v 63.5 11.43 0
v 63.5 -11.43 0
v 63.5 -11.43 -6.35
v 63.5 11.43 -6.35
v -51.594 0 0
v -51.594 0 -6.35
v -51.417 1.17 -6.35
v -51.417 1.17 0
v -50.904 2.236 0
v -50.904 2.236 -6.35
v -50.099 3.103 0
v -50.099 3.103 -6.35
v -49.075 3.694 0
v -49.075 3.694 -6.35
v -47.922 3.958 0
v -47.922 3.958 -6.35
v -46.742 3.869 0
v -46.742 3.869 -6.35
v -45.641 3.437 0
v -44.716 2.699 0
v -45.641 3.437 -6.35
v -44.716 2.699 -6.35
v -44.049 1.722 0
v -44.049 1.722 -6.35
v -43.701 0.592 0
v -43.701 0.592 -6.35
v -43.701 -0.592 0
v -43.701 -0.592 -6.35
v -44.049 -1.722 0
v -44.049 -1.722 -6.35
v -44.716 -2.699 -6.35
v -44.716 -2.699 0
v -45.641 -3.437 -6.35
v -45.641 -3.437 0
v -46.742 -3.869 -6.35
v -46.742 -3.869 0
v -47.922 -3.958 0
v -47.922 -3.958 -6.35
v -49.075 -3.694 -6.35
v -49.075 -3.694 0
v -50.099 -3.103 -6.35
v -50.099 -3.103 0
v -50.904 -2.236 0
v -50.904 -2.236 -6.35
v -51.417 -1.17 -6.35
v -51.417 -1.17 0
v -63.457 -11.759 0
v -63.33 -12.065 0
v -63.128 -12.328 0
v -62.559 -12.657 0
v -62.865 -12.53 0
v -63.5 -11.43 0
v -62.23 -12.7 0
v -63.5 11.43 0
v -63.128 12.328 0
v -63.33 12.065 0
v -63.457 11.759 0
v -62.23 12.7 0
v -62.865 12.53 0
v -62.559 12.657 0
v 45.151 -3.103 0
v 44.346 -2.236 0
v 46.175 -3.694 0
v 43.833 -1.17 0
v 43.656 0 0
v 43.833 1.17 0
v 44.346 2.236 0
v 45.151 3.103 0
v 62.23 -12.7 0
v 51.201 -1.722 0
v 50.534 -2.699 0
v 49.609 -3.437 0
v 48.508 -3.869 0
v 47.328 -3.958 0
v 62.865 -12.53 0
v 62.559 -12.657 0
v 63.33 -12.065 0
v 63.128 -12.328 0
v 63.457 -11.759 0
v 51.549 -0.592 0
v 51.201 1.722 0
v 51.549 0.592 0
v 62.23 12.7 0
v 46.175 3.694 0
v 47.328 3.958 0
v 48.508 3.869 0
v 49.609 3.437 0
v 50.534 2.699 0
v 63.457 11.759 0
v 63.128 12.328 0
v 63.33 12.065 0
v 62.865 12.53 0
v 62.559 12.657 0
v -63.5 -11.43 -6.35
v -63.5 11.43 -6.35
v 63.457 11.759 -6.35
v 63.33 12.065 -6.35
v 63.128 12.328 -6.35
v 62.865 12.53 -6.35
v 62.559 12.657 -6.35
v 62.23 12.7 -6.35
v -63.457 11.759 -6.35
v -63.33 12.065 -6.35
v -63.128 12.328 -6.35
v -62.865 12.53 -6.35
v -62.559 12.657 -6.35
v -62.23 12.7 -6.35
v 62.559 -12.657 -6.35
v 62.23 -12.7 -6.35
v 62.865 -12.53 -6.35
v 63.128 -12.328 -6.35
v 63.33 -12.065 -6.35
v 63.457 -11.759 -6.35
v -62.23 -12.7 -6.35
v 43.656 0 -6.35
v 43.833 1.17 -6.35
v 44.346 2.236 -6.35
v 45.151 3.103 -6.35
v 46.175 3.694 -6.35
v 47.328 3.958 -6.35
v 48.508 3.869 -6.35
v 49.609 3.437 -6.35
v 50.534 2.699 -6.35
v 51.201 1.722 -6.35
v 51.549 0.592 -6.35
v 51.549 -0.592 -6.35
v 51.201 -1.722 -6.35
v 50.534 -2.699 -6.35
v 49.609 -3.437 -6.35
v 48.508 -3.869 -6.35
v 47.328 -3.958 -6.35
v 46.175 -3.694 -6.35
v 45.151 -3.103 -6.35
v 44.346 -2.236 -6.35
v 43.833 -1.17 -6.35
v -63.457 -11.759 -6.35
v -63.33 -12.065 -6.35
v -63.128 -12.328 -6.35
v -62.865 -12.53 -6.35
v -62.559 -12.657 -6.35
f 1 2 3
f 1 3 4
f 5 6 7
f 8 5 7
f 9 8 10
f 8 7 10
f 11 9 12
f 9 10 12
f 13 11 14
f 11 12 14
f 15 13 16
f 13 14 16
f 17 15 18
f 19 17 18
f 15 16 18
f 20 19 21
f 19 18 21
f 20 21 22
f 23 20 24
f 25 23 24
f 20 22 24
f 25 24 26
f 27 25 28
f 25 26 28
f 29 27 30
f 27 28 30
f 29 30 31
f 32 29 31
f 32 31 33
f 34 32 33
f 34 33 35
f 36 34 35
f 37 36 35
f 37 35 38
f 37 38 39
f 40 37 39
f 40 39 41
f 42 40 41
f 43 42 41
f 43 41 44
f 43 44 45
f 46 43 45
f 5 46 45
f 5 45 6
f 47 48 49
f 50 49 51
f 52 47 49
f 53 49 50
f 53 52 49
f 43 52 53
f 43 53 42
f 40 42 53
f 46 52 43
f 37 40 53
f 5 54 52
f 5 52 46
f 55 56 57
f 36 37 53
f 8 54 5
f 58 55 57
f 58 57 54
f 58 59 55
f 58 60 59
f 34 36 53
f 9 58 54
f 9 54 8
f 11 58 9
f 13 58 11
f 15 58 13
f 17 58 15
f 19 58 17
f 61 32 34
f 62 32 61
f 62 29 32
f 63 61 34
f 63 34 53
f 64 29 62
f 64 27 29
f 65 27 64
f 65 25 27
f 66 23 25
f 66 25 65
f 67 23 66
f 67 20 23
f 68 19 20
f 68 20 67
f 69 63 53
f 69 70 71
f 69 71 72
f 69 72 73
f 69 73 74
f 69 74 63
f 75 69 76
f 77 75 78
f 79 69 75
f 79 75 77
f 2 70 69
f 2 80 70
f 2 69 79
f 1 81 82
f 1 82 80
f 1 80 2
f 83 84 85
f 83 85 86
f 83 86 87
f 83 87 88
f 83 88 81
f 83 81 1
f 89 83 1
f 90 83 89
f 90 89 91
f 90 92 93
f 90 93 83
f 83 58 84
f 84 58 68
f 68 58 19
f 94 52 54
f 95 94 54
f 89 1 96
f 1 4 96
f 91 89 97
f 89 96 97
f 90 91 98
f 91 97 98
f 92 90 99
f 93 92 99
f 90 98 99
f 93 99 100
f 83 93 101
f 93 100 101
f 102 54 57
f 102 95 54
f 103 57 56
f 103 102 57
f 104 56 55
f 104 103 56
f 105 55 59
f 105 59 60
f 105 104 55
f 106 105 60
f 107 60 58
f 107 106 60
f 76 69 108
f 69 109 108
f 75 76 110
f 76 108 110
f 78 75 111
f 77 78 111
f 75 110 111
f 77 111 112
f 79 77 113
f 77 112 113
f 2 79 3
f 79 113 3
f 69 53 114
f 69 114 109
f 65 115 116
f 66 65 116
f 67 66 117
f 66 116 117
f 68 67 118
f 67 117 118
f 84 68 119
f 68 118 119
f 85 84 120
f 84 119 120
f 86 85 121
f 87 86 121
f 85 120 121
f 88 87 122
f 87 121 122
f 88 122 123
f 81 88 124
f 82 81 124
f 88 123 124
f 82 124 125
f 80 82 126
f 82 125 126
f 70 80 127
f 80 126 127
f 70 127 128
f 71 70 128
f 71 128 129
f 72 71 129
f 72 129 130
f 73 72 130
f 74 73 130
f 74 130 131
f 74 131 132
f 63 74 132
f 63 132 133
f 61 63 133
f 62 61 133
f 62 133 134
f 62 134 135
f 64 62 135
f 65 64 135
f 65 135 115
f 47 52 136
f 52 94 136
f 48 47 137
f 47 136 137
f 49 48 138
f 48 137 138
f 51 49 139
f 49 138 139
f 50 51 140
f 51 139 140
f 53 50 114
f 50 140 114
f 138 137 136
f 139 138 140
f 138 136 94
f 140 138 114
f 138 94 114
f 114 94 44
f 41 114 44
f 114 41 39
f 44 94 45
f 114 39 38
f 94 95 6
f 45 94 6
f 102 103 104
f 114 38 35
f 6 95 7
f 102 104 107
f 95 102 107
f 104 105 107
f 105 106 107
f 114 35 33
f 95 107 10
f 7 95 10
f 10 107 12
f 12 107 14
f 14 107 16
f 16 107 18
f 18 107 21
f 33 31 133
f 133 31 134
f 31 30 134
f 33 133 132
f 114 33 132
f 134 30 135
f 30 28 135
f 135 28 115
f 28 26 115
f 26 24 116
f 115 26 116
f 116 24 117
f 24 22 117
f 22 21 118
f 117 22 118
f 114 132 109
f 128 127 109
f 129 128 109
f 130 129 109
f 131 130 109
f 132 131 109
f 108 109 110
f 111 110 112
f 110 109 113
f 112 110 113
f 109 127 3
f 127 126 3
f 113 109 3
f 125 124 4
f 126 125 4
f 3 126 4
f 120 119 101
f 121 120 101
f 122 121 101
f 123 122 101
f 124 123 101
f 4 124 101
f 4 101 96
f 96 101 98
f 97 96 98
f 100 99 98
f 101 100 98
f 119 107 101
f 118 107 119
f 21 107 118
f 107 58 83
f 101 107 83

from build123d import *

# Parameters (mm, degrees)
F0_W     = 127
F0_H     = 25.4
F1_DEPTH = 6.35
F2_R     = 1.27
F4_D     = 7.9375


with BuildPart() as f1:
    # F0 (on Top) → F1 (new body)
    with BuildSketch(Plane.XY):
        Rectangle(F0_W, F0_H)
    extrude(amount=-F1_DEPTH)

    # F2
    f2_edges = [f1.edges().sort_by_distance(p)[0] for p in [
        (-63.5, -12.7, -3.175),
        (-63.5, 12.7, -3.175),
        (63.5, 12.7, -3.175),
        (63.5, -12.7, -3.175),
    ]]
    fillet(f2_edges, radius=F2_R)

    # F4 (through all)
    with Locations(Plane.XY):
        with Locations((-47.625, 0), (47.625, 0)):
            Hole(F4_D / 2)


solid = f1.part
